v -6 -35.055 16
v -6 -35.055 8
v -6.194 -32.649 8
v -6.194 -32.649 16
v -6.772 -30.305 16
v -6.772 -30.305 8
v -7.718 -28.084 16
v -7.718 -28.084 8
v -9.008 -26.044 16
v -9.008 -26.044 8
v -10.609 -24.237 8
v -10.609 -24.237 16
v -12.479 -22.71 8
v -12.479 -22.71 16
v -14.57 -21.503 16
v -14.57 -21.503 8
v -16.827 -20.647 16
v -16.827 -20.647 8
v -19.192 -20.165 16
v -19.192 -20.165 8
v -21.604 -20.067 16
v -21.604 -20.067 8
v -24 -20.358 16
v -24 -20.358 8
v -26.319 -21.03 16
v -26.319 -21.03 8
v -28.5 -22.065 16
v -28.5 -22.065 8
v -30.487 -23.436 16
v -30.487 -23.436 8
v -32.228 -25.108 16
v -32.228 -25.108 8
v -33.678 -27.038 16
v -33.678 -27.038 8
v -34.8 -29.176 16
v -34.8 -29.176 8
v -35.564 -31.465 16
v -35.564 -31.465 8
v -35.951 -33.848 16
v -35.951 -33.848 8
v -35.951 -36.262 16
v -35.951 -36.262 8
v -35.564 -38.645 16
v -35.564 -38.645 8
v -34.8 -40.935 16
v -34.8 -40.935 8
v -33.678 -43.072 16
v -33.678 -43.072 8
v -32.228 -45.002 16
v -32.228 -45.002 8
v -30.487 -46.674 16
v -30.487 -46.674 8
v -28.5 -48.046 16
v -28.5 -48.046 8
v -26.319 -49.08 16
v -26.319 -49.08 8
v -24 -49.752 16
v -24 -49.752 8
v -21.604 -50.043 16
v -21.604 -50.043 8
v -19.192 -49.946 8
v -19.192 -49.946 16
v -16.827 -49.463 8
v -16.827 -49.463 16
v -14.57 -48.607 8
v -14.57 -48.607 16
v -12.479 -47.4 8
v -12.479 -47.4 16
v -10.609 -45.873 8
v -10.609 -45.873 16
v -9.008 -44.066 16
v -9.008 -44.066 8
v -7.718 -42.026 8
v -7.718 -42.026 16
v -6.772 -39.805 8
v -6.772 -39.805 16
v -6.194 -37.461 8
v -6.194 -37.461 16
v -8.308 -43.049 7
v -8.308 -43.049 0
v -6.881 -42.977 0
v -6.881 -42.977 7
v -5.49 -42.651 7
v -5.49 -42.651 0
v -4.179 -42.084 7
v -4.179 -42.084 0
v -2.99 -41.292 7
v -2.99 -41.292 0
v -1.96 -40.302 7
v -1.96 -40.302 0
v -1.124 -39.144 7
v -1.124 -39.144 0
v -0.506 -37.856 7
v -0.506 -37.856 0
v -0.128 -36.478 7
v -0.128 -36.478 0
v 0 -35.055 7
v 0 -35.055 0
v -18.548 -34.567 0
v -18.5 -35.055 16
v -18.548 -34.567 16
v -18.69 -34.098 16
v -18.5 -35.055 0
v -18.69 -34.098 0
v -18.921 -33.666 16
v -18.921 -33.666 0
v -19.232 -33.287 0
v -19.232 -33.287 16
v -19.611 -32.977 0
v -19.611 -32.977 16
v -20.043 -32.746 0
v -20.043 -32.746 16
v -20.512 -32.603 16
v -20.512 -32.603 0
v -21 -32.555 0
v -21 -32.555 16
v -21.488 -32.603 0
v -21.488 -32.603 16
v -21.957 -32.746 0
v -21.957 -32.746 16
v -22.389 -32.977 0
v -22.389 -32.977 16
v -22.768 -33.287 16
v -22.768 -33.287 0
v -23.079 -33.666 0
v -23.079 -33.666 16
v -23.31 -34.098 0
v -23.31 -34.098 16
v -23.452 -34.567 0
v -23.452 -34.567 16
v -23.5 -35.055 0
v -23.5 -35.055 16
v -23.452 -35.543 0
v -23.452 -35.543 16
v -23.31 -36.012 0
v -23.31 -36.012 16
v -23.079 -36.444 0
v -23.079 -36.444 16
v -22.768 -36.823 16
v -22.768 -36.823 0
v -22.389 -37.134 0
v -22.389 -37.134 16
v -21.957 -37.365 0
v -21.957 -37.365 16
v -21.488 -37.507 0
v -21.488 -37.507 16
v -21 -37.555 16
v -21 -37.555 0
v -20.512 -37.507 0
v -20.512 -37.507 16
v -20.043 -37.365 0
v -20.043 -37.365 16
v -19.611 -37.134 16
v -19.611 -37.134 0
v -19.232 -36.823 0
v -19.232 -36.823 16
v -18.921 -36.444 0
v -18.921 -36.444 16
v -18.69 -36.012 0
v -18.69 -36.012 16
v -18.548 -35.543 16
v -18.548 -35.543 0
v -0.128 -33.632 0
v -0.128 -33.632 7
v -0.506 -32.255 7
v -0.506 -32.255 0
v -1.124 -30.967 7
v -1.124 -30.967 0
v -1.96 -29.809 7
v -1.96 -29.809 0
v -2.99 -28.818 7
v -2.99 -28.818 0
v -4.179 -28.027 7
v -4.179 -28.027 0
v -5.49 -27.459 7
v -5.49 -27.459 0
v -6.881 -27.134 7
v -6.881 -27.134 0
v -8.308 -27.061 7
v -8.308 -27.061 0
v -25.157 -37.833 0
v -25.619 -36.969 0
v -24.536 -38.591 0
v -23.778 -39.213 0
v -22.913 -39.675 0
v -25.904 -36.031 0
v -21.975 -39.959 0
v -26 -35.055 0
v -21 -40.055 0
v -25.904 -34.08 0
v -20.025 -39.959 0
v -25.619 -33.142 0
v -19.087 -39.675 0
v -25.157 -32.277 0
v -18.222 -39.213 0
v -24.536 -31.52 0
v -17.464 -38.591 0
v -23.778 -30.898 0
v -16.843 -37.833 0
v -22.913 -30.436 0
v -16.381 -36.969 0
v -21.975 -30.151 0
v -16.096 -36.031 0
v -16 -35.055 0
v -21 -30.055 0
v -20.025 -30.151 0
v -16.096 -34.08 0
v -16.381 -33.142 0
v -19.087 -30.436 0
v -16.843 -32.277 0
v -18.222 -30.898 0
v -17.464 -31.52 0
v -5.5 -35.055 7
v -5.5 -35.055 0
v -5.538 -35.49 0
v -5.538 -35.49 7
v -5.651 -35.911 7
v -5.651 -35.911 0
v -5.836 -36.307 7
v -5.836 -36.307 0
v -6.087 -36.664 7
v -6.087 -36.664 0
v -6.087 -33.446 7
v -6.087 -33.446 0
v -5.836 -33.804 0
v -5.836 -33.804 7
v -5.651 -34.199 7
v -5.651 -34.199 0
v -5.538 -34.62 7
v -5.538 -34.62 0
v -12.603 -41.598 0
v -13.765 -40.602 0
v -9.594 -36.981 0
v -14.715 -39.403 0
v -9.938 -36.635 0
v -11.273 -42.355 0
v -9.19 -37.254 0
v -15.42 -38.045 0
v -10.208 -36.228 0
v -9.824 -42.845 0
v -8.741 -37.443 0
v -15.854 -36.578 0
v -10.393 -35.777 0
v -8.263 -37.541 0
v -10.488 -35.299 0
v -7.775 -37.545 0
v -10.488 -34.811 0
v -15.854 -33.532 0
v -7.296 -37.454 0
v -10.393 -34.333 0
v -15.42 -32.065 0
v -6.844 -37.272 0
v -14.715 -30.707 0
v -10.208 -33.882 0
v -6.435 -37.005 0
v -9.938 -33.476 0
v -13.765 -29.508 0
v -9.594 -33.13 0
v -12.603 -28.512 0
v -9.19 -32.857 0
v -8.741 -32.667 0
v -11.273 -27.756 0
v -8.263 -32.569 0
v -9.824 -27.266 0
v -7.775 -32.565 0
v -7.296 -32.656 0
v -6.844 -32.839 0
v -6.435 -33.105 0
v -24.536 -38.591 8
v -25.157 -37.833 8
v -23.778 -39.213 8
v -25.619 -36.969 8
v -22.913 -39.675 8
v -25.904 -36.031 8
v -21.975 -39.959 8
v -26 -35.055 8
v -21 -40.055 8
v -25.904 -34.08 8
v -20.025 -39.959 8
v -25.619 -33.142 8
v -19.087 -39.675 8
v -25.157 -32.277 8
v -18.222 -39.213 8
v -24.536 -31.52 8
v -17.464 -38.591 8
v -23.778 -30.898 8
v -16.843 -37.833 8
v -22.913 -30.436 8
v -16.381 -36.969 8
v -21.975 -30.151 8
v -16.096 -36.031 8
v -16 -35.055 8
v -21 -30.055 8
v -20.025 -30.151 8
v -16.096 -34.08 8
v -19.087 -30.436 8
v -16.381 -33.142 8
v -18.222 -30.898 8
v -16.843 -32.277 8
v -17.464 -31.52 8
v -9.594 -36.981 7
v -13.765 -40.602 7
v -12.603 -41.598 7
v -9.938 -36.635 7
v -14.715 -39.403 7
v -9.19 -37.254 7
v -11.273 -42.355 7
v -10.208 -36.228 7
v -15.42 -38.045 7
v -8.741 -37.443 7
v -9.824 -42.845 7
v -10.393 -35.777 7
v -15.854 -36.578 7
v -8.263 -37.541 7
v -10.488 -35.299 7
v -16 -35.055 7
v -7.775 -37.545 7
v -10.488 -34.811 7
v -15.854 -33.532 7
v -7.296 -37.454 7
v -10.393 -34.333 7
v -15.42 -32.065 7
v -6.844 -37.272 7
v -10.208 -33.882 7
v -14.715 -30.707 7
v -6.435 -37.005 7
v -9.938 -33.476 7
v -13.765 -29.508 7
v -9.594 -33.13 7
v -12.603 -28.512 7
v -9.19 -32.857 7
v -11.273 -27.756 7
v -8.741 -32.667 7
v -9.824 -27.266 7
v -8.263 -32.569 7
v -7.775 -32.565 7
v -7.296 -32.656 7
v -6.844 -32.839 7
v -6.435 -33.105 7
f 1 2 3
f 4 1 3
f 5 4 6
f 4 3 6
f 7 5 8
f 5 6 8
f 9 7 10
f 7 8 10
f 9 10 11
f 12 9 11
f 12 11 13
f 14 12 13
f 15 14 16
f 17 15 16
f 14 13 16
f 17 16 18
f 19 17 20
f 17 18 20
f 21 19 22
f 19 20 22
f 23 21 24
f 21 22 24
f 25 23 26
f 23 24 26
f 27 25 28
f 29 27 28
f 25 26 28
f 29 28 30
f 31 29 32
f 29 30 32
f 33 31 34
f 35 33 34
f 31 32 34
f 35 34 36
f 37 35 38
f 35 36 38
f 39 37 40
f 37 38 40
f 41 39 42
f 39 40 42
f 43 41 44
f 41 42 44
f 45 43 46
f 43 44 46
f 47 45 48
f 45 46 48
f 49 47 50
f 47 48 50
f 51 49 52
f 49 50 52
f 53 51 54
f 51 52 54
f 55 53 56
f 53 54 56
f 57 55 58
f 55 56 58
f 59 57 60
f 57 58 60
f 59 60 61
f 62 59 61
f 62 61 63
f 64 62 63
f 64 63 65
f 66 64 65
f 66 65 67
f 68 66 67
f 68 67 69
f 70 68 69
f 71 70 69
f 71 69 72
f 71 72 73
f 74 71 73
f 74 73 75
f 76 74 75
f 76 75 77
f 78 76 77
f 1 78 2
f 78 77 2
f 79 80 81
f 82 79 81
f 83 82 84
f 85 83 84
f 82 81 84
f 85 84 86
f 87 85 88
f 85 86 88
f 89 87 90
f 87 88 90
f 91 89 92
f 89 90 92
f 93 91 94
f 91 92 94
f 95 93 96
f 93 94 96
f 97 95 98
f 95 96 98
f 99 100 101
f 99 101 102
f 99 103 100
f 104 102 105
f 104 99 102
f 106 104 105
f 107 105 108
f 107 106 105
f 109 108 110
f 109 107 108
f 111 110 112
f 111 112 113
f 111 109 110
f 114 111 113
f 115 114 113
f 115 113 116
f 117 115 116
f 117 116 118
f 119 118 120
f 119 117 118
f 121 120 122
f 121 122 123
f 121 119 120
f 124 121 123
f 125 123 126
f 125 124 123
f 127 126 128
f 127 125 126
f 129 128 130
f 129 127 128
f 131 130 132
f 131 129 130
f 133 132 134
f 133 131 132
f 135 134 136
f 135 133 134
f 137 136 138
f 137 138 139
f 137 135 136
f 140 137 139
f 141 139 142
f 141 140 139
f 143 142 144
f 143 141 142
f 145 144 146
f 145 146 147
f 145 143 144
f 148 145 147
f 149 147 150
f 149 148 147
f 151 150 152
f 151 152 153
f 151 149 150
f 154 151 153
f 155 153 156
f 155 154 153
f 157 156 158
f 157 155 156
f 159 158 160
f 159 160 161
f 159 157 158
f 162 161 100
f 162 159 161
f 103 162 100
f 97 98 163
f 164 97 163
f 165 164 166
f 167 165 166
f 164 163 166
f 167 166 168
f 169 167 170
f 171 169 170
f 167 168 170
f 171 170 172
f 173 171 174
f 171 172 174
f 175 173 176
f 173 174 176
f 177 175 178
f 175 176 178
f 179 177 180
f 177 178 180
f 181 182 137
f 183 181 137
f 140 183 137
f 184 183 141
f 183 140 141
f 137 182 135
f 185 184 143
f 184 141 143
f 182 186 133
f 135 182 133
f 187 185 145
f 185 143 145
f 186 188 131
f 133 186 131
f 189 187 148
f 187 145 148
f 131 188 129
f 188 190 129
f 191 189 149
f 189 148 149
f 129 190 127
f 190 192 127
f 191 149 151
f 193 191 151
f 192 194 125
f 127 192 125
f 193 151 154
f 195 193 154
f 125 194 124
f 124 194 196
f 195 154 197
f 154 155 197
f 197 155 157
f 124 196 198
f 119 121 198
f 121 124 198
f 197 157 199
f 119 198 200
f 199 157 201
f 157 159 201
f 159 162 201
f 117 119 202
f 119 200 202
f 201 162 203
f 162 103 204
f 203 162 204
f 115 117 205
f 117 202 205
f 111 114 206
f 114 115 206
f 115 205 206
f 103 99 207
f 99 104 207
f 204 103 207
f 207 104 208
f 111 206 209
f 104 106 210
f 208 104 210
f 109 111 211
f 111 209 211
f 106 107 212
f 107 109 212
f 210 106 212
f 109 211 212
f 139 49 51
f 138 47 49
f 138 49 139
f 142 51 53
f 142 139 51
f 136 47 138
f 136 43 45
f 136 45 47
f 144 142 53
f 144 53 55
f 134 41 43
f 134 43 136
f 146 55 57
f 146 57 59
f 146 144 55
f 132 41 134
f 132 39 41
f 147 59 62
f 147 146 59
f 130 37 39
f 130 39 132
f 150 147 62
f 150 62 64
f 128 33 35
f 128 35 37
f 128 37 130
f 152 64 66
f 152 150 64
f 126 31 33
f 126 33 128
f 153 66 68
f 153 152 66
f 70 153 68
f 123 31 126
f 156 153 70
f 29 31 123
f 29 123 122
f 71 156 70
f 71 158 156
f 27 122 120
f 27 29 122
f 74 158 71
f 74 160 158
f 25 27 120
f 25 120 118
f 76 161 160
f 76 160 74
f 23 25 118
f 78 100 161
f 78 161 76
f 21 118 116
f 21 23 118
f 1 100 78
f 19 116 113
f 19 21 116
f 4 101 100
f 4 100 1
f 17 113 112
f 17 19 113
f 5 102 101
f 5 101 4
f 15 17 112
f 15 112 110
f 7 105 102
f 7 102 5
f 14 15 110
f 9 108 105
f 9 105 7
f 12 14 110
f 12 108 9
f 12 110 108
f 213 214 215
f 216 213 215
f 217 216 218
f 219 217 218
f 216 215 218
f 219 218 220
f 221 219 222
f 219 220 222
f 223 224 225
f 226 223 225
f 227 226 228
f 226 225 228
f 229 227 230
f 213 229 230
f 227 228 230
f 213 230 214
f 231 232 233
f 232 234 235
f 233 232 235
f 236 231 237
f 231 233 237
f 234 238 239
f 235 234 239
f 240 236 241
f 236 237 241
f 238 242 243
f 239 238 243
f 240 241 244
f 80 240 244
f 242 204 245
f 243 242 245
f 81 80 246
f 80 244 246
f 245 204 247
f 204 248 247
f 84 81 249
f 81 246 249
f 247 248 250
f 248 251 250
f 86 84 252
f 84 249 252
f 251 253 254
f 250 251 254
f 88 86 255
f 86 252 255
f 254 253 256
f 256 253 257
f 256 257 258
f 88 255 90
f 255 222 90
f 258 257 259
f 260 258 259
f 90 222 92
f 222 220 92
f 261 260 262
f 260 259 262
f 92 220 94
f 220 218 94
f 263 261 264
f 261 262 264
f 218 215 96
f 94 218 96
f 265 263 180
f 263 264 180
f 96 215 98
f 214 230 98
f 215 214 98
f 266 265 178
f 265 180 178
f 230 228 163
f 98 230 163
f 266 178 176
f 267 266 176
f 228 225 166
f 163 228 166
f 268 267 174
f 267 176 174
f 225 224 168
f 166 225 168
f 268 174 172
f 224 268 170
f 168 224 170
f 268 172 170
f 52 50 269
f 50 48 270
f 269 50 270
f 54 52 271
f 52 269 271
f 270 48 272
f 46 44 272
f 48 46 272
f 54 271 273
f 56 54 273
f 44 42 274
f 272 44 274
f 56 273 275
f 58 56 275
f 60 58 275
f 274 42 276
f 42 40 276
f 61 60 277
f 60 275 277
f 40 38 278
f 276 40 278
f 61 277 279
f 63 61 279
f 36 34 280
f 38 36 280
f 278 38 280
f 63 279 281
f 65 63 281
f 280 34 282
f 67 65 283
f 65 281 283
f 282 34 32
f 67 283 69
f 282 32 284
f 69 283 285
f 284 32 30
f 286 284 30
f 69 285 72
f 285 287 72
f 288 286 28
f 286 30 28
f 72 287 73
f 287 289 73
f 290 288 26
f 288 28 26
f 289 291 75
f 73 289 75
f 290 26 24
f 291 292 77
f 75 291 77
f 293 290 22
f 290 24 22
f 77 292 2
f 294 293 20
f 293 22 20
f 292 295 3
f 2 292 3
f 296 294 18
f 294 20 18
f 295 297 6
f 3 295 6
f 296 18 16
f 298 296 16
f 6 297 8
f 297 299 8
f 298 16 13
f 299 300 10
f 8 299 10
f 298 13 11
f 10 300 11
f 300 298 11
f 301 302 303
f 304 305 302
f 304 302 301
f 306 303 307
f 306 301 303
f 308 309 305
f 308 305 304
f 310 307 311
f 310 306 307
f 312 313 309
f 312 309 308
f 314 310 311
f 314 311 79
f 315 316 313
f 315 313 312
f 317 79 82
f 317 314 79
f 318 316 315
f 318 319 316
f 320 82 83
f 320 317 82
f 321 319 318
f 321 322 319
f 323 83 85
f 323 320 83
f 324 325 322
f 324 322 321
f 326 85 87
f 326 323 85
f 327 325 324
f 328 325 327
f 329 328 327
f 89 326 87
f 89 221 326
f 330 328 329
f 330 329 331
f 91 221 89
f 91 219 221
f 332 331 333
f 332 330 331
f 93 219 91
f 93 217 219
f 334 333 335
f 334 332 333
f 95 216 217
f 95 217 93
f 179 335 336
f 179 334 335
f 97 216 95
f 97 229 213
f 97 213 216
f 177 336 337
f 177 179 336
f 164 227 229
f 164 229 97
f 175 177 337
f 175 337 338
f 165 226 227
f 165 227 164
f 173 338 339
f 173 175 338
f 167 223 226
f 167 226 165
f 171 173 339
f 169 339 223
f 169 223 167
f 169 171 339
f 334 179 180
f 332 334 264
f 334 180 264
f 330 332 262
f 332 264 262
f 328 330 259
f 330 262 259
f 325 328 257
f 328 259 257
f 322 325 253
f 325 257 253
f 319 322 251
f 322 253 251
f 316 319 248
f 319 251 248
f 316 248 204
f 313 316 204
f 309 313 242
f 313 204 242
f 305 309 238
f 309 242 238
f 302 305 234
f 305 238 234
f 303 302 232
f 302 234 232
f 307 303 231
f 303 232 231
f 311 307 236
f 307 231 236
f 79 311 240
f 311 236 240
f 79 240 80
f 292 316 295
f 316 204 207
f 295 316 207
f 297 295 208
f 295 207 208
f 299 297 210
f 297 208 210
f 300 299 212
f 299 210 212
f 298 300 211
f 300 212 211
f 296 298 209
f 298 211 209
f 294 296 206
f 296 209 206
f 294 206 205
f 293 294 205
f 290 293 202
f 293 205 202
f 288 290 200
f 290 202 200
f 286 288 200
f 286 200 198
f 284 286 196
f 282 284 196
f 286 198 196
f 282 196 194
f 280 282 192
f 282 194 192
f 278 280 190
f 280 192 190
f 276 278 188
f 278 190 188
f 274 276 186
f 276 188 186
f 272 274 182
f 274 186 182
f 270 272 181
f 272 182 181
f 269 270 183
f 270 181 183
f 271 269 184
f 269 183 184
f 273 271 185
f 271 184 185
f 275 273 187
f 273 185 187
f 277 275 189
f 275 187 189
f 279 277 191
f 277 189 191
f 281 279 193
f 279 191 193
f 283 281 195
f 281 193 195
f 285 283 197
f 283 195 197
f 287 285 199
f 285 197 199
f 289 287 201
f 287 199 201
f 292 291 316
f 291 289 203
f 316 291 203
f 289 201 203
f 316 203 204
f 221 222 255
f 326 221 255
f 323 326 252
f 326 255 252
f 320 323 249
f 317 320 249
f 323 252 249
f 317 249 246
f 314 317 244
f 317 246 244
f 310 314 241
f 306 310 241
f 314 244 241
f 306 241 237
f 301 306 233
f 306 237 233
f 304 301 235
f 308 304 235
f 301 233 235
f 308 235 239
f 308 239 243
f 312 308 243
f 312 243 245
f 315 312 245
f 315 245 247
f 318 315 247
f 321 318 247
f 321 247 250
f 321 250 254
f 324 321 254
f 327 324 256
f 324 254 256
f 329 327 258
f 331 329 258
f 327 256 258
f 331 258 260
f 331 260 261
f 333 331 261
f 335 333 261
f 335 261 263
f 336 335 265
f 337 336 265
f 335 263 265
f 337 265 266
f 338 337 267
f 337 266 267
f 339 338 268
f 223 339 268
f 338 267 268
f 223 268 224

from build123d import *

# Parameters (mm, degrees)
F0_R     = 5
F0_R_2   = 2.5
F1_DEPTH = 8
F2_R     = 15
F2_R_2   = 5
F2_R_3   = 2.5
F3_DEPTH = 8
F4_DEPTH = 7


# Not quite as in the source:
# - a feature names something its author has since deleted; it is built from what else it names


with BuildPart() as f1:
    # F0 (on Top) → F1 (new body)
    with BuildSketch(Plane.XY):
        with Locations((-21, -35.0552037954)):
            Circle(F0_R)
        with Locations((-21, -35.0552037954)):
            Circle(F0_R_2, mode=Mode.SUBTRACT)
    extrude(amount=F1_DEPTH)

    # F2 (on face) → F3 (join)
    with BuildSketch(Plane.XY.offset(8)):
        with Locations((-21, -35.0552037954)):
            Circle(F2_R)
        with Locations((-21, -35.0552037954)):
            Circle(F2_R_2, mode=Mode.SUBTRACT)
        with Locations((-21, -35.0552037954)):
            Circle(F2_R_2)
        with Locations((-21, -35.0552037954)):
            Circle(F2_R_3, mode=Mode.SUBTRACT)
    extrude(amount=F3_DEPTH)

    # F0 (on Top) → F4 (join)
    with BuildSketch(Plane.XY):
        with BuildLine():
            ThreePointArc((-6.0865384615, -36.6641366532), (-10.5, -35.0552037954), (-6.0865384615, -33.4462709377))
            ThreePointArc((-6.0865384615, -33.4462709377), (-6.832708382, -30.1269334892), (-8.3076923077, -27.0611231451))
            ThreePointArc((-8.3076923077, -27.0611231451), (-13.764613537, -29.5082018332), (-16, -35.0552037954))
            ThreePointArc((-16, -35.0552037954), (-13.764613537, -40.6022057577), (-8.3076923077, -43.0492844458))
            ThreePointArc((-8.3076923077, -43.0492844458), (-6.832708382, -39.9834741017), (-6.0865384615, -36.6641366532))
        make_face()
        with BuildLine():
            ThreePointArc((-8.3076923077, -27.0611231451), (-6.832708382, -30.1269334892), (-6.0865384615, -33.4462709377))
            ThreePointArc((-6.0865384615, -33.4462709377), (-5.6512073478, -34.1989485316), (-5.5, -35.0552037954))
            ThreePointArc((-5.5, -35.0552037954), (-5.6512073478, -35.9114590593), (-6.0865384615, -36.6641366532))
            ThreePointArc((-6.0865384615, -36.6641366532), (-6.832708382, -39.9834741017), (-8.3076923077, -43.0492844458))
            ThreePointArc((-8.3076923077, -43.0492844458), (-2.4529980377, -40.8198173324), (0, -35.0552037954))
            ThreePointArc((0, -35.0552037954), (-2.4529980377, -29.2905902584), (-8.3076923077, -27.0611231451))
        make_face()
    extrude(amount=F4_DEPTH)


solid = f1.part
